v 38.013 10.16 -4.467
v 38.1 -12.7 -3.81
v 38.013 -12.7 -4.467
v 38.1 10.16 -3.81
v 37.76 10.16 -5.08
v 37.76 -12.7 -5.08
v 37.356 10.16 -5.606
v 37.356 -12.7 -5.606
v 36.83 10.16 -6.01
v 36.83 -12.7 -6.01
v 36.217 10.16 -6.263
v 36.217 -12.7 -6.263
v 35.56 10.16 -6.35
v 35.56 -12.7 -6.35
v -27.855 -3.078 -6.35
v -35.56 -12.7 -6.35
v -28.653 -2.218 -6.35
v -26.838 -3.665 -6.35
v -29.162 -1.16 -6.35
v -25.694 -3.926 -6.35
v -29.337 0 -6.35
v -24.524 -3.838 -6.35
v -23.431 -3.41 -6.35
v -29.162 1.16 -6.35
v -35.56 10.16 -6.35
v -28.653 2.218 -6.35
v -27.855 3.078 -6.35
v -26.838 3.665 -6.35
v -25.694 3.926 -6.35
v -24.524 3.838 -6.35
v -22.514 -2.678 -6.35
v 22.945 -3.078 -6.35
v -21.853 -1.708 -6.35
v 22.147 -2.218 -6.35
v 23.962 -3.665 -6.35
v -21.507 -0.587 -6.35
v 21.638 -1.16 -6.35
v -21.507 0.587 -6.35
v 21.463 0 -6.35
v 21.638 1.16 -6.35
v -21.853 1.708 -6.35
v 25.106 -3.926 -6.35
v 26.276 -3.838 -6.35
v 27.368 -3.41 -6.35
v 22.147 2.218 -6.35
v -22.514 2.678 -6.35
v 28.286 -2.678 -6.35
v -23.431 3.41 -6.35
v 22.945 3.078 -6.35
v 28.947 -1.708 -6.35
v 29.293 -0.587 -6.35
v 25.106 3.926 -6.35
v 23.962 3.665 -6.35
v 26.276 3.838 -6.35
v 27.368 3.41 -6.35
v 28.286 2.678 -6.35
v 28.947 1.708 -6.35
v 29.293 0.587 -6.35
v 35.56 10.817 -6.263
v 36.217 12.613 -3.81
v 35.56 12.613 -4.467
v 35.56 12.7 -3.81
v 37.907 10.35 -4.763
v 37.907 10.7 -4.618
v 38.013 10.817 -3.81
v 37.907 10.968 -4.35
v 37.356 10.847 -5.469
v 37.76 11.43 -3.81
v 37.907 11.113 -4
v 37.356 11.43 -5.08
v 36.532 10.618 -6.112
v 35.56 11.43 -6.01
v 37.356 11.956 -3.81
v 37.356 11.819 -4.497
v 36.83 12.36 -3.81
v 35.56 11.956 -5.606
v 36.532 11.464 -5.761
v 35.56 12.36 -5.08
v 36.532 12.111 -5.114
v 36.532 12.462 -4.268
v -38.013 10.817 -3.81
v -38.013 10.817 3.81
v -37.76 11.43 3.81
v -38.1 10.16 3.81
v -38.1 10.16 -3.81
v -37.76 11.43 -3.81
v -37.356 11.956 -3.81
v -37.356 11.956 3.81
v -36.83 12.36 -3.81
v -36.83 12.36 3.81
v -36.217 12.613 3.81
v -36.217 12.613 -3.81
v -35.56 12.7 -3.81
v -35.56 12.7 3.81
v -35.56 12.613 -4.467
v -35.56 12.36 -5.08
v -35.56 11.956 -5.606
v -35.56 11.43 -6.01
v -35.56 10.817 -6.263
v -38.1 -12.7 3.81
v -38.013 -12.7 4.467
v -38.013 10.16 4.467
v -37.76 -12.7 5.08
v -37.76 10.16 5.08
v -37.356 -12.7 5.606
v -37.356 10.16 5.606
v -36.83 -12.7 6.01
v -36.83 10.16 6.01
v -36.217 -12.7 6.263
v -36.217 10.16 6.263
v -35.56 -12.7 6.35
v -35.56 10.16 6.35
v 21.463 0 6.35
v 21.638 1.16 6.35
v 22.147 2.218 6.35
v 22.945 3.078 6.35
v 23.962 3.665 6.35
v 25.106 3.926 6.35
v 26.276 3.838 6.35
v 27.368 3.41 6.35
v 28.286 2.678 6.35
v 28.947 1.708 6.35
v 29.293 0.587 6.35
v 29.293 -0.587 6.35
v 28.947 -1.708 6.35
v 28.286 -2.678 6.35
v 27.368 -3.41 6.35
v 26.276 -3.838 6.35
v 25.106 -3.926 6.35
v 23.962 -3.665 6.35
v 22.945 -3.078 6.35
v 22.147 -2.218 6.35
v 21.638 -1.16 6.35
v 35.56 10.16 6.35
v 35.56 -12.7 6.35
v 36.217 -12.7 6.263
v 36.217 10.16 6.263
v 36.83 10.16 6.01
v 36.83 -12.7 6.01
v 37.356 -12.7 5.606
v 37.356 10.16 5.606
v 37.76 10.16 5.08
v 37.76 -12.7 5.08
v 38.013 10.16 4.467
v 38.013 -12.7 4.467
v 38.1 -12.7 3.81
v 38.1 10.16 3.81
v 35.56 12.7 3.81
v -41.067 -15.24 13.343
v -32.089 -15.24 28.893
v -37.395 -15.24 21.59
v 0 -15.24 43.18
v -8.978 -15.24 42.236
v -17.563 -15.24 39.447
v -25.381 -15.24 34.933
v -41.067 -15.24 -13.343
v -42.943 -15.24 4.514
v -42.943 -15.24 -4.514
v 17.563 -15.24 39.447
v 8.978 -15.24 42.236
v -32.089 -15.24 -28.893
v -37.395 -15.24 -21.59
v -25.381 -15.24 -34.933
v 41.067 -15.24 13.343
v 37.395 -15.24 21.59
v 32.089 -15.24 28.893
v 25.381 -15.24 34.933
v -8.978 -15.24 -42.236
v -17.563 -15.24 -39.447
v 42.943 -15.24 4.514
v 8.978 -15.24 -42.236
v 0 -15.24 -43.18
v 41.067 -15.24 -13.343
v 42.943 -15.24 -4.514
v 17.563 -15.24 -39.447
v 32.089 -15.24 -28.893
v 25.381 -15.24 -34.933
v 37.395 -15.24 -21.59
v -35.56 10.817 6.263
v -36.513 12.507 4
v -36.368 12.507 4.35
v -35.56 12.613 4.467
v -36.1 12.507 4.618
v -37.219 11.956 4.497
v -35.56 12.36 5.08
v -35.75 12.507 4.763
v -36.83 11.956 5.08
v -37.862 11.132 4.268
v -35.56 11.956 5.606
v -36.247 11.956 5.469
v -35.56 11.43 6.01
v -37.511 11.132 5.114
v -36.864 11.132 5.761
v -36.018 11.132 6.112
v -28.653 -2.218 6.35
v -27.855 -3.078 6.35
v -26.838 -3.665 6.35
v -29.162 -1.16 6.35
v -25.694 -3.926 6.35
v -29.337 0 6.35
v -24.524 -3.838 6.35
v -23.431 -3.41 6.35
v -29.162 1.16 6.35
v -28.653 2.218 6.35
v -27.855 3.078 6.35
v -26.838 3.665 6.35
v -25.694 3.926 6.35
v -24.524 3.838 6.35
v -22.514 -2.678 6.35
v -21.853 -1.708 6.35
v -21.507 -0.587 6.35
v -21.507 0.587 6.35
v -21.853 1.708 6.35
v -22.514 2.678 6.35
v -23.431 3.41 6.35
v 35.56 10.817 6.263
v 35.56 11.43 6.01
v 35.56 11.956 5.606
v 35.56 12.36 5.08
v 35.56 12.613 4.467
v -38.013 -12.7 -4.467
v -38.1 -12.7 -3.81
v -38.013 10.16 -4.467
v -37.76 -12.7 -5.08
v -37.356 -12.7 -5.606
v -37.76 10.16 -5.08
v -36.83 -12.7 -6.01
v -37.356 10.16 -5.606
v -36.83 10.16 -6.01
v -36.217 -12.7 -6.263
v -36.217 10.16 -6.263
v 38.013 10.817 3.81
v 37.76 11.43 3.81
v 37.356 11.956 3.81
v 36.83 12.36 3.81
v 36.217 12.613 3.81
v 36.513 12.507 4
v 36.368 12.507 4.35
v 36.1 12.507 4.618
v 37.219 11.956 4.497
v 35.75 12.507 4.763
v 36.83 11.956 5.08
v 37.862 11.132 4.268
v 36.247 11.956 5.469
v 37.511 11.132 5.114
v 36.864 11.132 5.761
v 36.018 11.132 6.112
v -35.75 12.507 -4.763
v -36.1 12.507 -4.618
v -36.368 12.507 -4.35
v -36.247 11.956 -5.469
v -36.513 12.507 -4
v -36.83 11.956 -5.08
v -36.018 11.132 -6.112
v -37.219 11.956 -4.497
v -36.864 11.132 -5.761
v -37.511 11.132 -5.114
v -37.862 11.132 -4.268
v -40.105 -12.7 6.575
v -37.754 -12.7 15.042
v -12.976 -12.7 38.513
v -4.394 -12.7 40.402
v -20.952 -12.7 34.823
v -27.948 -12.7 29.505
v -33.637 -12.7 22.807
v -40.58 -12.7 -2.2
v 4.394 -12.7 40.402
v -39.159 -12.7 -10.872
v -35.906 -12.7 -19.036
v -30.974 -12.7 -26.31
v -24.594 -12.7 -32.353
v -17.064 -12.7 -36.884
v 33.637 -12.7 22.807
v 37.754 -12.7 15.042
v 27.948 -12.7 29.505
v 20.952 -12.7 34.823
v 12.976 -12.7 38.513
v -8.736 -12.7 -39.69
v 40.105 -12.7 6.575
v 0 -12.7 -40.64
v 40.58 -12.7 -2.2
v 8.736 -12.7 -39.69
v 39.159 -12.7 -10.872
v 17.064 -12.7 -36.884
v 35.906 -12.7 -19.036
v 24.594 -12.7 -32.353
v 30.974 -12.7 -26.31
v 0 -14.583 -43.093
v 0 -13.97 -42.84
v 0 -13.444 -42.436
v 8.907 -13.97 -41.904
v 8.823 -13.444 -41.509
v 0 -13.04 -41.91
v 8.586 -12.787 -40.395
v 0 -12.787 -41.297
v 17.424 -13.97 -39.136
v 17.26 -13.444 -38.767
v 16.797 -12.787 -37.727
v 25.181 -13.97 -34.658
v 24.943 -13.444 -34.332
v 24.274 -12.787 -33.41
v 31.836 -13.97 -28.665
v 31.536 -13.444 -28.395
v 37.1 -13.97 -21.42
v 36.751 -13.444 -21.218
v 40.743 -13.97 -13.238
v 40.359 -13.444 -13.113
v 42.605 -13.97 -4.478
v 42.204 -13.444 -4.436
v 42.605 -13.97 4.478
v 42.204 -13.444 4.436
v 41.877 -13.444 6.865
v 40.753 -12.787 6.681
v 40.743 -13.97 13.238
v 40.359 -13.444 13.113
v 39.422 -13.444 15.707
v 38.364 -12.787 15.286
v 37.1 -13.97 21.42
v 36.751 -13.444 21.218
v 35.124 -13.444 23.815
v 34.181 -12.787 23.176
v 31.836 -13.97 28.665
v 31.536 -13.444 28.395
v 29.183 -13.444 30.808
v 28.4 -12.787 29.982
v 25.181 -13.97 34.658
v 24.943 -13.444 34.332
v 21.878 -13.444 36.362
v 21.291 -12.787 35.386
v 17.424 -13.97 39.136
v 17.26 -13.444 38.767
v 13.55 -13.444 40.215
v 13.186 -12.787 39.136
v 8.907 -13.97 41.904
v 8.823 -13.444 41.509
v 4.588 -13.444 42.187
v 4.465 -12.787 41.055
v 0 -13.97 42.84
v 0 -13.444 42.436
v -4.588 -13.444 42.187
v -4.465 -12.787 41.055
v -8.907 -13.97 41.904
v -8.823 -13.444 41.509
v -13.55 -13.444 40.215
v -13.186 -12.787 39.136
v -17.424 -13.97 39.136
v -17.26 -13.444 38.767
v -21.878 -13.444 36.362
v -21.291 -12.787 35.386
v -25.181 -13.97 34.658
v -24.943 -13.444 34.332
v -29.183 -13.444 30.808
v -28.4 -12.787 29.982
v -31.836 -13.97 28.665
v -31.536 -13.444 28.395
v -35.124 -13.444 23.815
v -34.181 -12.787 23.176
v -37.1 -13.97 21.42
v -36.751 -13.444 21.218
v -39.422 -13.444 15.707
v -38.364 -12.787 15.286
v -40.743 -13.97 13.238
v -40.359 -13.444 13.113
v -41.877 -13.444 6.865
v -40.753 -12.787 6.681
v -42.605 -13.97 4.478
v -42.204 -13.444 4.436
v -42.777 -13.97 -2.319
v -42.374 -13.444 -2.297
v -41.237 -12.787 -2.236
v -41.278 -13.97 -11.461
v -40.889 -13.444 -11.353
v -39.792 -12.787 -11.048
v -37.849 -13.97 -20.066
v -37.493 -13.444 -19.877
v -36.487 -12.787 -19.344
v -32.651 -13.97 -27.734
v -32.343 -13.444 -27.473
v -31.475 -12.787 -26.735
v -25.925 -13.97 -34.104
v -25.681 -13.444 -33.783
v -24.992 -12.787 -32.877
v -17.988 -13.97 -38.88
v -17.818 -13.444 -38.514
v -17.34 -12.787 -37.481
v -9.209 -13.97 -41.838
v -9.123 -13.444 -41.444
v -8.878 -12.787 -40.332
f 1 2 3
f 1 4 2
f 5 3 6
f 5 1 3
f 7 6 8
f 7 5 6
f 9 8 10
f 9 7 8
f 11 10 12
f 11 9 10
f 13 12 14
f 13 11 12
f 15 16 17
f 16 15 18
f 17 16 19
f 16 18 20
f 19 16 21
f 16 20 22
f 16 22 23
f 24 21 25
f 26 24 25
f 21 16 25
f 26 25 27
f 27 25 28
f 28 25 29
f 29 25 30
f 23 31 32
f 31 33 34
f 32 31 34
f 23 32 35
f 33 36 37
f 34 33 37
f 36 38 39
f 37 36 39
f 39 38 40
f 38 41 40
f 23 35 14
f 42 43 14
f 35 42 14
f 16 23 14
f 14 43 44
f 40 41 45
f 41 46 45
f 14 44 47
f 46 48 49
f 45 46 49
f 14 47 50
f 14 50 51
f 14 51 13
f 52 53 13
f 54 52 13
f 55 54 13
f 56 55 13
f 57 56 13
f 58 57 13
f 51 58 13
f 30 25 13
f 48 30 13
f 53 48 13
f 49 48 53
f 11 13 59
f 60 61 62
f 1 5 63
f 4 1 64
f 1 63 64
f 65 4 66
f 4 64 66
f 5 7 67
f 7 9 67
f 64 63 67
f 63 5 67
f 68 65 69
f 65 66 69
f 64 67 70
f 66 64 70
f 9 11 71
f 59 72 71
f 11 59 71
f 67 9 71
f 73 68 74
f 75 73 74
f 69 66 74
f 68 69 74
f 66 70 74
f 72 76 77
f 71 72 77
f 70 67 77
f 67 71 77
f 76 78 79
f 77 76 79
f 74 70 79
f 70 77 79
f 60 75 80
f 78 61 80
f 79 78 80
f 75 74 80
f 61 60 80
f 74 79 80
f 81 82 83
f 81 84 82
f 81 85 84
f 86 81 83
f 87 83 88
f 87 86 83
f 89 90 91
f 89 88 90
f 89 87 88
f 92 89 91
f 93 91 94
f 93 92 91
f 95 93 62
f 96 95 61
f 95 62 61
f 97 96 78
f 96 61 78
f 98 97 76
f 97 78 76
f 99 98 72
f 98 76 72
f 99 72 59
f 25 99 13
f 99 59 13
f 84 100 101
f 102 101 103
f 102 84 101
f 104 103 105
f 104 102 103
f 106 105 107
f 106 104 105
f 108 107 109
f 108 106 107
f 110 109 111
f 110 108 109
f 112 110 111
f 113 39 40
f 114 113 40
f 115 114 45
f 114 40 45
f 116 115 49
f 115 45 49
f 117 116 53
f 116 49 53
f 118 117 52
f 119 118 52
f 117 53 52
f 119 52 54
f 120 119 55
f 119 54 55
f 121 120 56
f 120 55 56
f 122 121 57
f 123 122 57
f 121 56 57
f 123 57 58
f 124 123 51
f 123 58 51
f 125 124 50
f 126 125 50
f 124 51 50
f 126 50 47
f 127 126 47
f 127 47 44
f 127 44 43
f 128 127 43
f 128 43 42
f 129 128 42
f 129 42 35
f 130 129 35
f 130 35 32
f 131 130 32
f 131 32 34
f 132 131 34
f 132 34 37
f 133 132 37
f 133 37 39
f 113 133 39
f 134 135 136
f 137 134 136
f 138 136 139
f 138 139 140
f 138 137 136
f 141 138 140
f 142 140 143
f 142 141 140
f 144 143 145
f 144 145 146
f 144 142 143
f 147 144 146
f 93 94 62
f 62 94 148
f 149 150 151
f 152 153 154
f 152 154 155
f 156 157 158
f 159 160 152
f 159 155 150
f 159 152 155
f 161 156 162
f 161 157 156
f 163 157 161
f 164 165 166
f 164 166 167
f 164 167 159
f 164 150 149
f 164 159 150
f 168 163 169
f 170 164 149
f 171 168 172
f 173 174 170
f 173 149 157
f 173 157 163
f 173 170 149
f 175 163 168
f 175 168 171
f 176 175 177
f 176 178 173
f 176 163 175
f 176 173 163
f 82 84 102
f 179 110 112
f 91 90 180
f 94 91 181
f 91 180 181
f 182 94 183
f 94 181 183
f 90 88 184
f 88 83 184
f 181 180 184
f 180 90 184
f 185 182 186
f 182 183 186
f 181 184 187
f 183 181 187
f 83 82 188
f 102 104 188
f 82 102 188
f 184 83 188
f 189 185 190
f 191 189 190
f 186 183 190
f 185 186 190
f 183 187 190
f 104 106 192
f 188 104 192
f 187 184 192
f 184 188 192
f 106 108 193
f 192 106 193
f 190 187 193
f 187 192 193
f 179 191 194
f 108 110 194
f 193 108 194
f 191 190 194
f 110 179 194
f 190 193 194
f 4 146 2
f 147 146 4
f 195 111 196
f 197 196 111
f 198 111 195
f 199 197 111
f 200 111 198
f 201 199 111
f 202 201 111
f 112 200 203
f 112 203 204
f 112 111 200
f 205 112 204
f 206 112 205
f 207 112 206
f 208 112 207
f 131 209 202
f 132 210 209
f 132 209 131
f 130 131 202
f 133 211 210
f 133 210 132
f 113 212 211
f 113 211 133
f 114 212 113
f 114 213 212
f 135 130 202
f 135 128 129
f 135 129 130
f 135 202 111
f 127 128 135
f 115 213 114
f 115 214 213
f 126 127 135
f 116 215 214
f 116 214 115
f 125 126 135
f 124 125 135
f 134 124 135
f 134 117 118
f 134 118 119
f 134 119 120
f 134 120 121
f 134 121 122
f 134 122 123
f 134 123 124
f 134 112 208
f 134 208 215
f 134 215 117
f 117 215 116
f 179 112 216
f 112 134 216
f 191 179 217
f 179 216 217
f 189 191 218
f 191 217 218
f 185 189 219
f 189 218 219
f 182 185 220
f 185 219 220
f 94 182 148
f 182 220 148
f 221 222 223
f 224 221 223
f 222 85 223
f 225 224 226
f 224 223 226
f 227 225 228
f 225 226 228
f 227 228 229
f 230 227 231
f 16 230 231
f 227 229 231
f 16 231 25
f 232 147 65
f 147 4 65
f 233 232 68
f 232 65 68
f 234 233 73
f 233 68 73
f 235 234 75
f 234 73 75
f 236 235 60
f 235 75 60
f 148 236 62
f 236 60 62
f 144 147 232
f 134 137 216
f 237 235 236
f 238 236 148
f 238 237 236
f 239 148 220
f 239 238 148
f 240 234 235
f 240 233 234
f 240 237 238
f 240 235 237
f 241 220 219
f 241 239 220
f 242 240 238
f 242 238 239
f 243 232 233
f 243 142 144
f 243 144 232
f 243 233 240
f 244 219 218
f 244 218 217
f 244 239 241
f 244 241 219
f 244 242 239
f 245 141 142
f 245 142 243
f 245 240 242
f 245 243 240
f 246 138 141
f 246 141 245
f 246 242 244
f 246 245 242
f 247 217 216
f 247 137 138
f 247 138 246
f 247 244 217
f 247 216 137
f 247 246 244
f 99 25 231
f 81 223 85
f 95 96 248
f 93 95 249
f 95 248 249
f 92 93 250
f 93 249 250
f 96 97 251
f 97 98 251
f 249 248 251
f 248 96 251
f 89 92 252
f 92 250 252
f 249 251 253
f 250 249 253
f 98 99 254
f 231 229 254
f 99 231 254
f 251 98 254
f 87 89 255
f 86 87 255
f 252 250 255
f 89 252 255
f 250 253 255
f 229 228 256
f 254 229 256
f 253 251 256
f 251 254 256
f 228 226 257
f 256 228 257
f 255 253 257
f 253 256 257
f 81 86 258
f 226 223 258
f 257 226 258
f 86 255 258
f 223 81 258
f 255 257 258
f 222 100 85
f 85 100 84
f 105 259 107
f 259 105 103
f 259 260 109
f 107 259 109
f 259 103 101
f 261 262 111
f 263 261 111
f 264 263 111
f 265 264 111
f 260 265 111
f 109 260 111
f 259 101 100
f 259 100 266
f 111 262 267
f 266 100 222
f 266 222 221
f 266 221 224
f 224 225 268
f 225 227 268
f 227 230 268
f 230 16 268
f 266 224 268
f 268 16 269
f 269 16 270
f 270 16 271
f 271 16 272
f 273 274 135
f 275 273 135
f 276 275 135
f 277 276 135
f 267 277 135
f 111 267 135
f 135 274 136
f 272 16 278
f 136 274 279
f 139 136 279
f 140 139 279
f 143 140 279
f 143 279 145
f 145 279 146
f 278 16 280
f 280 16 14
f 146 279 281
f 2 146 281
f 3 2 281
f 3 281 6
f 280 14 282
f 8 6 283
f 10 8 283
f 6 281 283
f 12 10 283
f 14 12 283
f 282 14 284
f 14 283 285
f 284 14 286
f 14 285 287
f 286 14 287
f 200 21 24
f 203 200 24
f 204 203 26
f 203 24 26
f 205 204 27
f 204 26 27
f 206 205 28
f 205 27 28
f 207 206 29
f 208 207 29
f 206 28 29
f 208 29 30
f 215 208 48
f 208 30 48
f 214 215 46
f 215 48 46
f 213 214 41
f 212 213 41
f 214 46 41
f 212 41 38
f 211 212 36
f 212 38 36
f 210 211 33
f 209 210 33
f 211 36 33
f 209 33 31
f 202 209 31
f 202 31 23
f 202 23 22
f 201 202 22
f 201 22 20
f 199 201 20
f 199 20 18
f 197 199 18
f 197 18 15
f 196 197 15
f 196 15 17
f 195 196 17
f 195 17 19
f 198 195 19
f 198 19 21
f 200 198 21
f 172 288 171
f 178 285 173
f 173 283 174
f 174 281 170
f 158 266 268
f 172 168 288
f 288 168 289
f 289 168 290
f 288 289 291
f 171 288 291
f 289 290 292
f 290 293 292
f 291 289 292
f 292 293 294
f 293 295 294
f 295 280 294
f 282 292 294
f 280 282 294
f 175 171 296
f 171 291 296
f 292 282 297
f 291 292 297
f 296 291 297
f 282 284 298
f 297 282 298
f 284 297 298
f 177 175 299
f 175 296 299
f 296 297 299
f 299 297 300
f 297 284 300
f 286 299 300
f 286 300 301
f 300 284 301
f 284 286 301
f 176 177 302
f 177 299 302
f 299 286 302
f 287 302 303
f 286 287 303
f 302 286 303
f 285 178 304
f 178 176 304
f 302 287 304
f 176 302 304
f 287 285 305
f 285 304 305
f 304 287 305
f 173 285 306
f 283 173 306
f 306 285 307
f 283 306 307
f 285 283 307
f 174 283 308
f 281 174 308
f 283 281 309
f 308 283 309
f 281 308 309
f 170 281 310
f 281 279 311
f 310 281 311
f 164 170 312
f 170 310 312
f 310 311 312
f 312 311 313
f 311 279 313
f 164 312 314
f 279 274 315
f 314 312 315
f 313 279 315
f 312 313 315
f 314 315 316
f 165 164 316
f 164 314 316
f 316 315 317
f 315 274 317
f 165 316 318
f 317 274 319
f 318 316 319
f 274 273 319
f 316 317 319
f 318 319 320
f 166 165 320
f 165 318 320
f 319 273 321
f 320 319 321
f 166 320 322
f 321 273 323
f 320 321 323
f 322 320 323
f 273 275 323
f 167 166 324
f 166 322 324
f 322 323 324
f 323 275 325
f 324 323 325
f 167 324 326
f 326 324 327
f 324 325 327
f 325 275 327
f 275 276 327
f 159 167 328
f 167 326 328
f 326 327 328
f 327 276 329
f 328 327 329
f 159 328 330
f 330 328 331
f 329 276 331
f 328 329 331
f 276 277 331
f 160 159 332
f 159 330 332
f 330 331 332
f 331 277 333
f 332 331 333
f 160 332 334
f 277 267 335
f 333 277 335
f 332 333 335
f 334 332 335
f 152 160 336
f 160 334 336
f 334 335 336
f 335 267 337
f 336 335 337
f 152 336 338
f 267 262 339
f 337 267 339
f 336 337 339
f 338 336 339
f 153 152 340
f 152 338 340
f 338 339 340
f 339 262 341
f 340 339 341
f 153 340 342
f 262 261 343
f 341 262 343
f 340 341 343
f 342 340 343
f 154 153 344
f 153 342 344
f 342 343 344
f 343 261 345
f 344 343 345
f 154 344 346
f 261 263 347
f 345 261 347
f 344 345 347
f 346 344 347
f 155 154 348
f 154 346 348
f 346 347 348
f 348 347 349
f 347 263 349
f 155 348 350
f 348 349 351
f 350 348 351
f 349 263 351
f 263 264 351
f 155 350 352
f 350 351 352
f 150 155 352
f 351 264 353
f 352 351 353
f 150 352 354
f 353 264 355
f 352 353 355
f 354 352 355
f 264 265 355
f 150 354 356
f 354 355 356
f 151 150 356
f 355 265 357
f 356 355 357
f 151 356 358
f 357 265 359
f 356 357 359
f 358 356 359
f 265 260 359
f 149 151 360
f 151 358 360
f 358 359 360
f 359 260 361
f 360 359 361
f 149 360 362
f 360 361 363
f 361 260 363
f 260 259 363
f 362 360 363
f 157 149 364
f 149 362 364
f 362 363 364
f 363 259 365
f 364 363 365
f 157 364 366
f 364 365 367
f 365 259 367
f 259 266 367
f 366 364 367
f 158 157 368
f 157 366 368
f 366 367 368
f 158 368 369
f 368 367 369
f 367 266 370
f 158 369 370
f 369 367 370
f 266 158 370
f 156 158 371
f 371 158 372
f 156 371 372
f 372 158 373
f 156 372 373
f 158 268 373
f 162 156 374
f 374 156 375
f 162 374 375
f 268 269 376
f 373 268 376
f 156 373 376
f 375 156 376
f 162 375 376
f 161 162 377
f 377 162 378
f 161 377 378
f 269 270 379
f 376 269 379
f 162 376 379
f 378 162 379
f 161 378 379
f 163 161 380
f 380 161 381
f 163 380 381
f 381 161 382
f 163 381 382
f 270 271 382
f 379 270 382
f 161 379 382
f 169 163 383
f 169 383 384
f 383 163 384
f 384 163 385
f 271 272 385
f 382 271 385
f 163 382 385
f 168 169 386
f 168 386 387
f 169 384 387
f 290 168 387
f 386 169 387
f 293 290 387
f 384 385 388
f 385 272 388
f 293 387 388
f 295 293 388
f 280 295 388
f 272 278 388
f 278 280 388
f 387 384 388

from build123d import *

# Parameters (mm, degrees)
SKETCH1_W                      = 76.2
SKETCH1_H                      = 25.4
BOSS_EXTRUDE1_DEPTH            = 6.35
FILLET1_R                      = 2.54
F_97_0_31_DIAMETER_HOLE1_D     = 7.874
F_97_0_31_DIAMETER_HOLE1_DEPTH = 25.4
F_97_0_31_DIAMETER_HOLE1_TIP   = 2.365588257
SKETCH4_R                      = 43.18
BOSS_EXTRUDE2_DEPTH            = 2.54
FILLET2_R                      = 2.54


with BuildPart() as part:
    # Sketch1 → Boss-Extrude1 (new, symmetric)
    with BuildSketch(Plane.XY):
        Rectangle(SKETCH1_W, SKETCH1_H)
    extrude(amount=BOSS_EXTRUDE1_DEPTH, both=True)

    # Fillet1
    fillet1_edges = [part.edges().sort_by_distance(p)[0] for p in [
        (-38.1, 0, 6.35),
        (38.1, 0, 6.35),
        (-38.1, 0, -6.35),
        (0, 12.7, -6.35),
        (38.1, 0, -6.35),
        (-38.1, 12.7, 0),
        (38.1, 12.7, 0),
        (0, 12.7, 6.35),
    ]]
    fillet(fillet1_edges, radius=FILLET1_R)

    # #97 (0.31) Diameter Hole1
    with Locations(Plane.XY.offset(6.35)):
        with Locations((25.4, 0), (-25.4, 0)):
            Hole(F_97_0_31_DIAMETER_HOLE1_D / 2, depth=F_97_0_31_DIAMETER_HOLE1_DEPTH)
            with Locations((0, 0, -(F_97_0_31_DIAMETER_HOLE1_DEPTH + F_97_0_31_DIAMETER_HOLE1_TIP / 2))):  # 118° drill point
                Cone(0, F_97_0_31_DIAMETER_HOLE1_D / 2, F_97_0_31_DIAMETER_HOLE1_TIP, mode=Mode.SUBTRACT)

    # Sketch4 → Boss-Extrude2 (add)
    with BuildSketch(Plane.XZ.offset(12.7)):
        with Locations(Location((0, 0, 0), (0, 0, 270))):
            Circle(SKETCH4_R)
    extrude(amount=BOSS_EXTRUDE2_DEPTH)

    # Fillet2
    fillet2_edges = [part.edges().sort_by_distance(p)[0] for p in [
        (0, -12.7, 43.18),
    ]]
    fillet(fillet2_edges, radius=FILLET2_R - 0.0001)  # a hair under: the kernel refuses the full size


solid = part.part
